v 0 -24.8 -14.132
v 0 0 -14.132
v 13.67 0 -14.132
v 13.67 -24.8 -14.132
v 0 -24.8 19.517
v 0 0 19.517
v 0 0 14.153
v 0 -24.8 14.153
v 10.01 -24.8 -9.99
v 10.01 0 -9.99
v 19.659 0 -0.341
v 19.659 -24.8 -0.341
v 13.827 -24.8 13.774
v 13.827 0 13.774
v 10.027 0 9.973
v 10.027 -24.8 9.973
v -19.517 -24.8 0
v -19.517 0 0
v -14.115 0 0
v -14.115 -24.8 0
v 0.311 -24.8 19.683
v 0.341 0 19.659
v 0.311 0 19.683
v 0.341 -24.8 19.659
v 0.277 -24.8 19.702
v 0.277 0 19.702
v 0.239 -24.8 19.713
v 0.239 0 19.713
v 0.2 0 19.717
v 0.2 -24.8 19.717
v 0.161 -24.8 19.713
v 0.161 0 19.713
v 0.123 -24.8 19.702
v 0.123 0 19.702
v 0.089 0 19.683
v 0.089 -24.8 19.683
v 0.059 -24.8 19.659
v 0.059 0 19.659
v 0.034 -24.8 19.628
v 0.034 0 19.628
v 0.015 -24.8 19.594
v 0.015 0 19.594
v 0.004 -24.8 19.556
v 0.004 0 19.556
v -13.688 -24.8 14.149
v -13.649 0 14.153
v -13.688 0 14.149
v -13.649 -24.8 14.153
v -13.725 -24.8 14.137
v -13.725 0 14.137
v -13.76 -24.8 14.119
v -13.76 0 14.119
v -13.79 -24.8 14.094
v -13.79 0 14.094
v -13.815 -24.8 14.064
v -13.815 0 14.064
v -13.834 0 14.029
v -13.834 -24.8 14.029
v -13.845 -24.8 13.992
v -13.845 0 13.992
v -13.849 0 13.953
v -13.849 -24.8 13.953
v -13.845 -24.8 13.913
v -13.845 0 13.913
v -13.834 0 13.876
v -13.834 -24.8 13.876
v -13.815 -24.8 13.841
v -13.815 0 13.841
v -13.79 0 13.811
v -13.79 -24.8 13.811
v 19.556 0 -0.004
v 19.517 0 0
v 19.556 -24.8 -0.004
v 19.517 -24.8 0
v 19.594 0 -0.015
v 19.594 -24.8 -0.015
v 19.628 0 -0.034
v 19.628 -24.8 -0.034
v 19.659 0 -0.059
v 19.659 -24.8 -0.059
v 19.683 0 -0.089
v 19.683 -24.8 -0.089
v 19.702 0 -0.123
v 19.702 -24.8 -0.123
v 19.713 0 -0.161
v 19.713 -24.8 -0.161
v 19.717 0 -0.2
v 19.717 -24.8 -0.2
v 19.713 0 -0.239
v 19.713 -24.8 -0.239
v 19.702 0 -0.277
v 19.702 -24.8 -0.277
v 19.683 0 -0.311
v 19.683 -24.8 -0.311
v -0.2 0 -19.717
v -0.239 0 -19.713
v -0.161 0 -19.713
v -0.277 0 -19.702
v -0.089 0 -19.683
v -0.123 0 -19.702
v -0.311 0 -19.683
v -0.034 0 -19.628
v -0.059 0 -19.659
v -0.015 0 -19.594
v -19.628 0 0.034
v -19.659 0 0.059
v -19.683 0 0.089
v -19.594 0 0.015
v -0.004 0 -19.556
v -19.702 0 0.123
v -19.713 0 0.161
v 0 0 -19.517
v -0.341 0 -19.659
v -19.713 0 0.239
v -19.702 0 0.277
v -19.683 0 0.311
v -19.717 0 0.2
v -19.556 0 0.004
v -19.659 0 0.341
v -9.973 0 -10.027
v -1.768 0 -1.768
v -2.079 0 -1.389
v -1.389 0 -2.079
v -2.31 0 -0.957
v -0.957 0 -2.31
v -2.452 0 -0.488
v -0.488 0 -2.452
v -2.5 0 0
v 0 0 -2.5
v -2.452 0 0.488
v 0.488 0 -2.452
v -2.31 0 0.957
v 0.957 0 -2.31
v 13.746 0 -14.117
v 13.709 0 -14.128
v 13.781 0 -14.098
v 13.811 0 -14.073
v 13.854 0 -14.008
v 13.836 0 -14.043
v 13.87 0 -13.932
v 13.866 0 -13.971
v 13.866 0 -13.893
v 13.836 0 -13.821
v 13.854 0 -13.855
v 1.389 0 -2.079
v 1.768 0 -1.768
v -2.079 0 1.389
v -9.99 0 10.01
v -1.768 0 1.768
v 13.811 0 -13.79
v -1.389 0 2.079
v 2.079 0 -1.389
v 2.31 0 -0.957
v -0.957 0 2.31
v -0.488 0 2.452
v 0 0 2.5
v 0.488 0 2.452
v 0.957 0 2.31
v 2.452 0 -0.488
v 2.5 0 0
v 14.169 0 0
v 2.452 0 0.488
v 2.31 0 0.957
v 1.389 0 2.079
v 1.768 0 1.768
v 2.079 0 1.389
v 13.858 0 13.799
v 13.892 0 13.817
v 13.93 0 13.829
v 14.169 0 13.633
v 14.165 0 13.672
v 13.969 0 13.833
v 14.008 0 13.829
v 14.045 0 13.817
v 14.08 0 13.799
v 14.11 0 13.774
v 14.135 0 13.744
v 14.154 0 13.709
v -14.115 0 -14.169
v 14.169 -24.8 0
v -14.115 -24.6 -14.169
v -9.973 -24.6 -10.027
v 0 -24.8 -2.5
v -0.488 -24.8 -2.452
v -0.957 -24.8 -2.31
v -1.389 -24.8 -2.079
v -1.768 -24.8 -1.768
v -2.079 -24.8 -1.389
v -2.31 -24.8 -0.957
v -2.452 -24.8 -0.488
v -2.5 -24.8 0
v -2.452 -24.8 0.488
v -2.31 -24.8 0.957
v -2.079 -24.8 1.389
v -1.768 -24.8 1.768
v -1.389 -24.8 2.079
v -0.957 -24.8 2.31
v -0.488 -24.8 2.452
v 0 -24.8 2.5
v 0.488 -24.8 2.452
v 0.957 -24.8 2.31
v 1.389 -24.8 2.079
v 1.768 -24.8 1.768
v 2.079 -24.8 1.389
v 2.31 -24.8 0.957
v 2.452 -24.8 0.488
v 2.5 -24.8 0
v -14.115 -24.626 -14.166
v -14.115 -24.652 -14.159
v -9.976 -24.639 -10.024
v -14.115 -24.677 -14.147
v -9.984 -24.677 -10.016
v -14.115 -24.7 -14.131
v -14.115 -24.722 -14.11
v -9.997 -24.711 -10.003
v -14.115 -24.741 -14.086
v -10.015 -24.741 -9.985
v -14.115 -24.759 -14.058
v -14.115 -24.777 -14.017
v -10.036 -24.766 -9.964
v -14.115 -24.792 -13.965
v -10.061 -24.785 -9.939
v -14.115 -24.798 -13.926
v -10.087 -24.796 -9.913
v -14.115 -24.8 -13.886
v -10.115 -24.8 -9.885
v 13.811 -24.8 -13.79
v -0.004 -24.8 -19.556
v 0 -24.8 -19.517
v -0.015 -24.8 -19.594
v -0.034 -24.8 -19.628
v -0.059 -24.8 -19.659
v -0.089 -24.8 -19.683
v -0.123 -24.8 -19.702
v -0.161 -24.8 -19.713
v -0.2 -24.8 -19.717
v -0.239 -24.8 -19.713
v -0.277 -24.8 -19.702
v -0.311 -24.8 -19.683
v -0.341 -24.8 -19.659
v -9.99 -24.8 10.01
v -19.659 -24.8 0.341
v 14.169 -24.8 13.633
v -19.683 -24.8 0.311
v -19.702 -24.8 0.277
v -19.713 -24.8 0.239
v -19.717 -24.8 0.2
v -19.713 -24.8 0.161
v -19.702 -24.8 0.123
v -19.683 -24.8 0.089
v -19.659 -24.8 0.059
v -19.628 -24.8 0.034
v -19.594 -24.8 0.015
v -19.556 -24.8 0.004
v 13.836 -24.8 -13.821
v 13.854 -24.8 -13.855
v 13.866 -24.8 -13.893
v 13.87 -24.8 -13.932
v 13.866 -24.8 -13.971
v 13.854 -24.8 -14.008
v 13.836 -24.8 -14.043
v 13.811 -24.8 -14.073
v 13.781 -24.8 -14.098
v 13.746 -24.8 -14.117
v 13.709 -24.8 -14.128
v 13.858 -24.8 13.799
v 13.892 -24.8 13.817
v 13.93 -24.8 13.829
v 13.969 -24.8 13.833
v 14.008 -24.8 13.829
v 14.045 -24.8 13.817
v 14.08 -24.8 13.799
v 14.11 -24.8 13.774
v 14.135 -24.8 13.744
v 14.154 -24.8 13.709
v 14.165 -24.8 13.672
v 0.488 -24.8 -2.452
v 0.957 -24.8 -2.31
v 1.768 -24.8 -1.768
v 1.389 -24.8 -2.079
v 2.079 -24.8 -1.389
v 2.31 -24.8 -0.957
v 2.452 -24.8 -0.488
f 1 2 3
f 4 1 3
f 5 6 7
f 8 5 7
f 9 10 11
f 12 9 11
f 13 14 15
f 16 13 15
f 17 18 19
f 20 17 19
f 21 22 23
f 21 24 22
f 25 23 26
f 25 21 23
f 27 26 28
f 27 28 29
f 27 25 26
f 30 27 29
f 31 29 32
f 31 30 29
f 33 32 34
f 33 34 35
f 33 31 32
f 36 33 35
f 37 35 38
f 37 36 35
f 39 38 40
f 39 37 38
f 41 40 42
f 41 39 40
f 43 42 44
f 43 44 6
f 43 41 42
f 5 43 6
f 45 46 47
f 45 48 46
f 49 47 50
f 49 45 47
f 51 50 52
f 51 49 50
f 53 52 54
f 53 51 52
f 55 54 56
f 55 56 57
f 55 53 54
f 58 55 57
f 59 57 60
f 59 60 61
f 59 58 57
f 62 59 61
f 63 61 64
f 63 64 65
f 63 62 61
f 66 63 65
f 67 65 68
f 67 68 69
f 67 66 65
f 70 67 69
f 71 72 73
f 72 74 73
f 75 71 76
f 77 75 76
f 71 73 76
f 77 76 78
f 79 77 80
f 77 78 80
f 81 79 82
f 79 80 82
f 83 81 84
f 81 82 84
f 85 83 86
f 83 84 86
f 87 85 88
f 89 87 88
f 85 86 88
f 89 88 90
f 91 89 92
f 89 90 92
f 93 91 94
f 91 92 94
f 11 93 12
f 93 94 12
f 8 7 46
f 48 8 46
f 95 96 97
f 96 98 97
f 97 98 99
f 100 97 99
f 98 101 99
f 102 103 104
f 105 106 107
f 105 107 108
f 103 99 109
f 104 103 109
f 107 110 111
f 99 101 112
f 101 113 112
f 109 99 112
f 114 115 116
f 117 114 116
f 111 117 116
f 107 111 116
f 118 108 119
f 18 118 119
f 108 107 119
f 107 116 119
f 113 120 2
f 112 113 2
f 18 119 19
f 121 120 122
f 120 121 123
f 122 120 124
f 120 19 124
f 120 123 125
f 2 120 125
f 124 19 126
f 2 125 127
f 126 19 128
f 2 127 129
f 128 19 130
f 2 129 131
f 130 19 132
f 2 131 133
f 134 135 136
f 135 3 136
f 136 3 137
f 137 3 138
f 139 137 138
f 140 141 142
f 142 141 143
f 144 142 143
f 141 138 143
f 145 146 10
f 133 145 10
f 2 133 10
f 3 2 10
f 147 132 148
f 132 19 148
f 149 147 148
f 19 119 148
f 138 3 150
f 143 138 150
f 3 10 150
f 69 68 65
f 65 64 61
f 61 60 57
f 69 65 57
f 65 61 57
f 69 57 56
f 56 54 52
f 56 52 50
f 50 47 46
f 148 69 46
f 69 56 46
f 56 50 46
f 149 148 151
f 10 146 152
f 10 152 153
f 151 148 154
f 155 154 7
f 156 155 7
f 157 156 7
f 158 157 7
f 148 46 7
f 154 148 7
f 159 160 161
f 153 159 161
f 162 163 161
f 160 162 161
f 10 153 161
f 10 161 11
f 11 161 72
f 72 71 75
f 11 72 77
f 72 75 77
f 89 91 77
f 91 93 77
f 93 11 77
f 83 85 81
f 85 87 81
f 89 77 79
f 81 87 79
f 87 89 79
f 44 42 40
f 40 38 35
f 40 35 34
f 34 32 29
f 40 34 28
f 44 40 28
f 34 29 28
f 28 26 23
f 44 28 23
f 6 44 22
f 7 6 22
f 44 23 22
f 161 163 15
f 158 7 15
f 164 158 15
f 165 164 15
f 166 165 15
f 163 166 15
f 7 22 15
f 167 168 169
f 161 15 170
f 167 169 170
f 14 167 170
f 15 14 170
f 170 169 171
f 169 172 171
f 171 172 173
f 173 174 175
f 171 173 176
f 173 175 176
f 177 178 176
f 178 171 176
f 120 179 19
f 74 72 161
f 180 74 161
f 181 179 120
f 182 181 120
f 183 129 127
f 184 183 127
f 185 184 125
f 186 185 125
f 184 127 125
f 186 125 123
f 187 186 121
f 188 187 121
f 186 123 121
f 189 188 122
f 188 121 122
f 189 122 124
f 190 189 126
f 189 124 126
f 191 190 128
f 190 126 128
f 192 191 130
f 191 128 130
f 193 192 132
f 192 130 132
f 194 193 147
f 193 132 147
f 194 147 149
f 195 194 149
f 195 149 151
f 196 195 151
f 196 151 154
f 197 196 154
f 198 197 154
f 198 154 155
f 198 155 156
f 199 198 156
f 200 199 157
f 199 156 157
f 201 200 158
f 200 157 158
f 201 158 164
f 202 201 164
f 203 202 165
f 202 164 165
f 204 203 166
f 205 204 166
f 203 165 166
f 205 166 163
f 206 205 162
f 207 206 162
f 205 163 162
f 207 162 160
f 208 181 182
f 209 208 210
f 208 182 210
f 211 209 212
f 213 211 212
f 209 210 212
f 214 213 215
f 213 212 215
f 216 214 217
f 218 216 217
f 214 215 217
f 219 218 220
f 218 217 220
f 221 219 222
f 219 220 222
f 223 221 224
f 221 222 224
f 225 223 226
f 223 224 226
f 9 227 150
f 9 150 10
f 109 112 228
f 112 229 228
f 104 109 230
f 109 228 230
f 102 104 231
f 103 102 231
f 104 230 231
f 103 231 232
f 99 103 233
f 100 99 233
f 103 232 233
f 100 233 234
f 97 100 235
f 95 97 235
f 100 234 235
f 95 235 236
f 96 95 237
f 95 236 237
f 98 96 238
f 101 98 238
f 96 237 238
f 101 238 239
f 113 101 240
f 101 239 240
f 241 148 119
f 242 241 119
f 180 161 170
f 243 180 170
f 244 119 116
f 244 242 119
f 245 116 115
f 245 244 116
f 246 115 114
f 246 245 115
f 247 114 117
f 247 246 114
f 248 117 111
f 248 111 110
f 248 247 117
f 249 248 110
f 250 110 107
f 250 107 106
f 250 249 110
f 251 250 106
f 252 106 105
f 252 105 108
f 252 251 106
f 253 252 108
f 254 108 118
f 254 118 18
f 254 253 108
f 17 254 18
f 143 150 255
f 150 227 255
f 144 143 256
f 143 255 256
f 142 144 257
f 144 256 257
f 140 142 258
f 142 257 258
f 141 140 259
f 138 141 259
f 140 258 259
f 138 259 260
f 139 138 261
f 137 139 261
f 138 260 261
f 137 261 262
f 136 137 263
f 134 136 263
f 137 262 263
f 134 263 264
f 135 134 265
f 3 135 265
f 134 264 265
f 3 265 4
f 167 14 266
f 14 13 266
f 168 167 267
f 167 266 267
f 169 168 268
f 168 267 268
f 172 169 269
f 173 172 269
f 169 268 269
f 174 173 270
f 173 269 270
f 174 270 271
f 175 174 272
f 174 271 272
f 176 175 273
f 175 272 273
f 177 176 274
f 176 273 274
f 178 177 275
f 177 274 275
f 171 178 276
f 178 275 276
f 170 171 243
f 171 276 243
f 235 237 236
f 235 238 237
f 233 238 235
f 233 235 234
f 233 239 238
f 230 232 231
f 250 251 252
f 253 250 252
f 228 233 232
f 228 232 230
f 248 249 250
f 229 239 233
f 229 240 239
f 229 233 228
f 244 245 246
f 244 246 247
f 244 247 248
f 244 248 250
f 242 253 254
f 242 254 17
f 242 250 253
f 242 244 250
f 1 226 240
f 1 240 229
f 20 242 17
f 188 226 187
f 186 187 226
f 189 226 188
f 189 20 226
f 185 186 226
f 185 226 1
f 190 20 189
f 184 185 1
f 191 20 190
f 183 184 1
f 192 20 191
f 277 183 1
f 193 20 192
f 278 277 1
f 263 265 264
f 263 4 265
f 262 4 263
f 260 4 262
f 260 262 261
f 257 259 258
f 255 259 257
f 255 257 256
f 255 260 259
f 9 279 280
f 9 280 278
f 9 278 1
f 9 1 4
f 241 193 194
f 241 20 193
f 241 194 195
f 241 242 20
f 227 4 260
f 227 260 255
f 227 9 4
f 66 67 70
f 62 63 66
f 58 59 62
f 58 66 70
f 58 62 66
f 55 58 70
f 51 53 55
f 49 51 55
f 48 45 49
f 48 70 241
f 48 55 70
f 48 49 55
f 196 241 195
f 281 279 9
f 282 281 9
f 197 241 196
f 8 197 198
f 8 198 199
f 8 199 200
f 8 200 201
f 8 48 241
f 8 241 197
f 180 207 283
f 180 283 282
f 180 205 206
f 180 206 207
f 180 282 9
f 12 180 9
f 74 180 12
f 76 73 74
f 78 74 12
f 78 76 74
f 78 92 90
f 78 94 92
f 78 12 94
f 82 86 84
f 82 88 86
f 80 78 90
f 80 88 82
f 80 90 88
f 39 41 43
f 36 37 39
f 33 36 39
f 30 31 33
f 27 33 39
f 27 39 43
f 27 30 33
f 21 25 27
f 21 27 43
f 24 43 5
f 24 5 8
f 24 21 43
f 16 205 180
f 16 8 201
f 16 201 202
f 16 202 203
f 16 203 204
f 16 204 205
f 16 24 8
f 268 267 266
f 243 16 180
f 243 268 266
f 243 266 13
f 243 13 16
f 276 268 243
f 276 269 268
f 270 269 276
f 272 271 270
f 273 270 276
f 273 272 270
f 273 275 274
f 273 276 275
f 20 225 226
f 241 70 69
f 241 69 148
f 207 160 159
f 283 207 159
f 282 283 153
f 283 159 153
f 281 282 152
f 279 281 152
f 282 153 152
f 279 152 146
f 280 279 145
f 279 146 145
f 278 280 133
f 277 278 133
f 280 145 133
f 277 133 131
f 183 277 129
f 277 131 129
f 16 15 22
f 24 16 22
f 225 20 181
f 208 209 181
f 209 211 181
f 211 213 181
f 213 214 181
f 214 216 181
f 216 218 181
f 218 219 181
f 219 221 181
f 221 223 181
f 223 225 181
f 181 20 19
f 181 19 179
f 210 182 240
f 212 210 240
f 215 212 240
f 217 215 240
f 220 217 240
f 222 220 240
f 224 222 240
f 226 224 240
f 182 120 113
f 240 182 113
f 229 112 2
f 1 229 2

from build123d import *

# Parameters (mm, degrees)
F1_DEPTH = 24.8
F2_R     = 0.2


with BuildPart() as f1:
    # F0 (on Front) → F1 (new body)
    with BuildSketch(Plane.XZ):
        Polygon((10.026696, 9.973304), (0, 20), (0, 14.152517), (-14.131747, 14.152517), (-9.989615, 10.010385), (-20, 0), (-14.115414, 0), (-14.115414, -14.168807), (-9.973304, -10.026696), (0, -20), (0, -14.131747), (14.152517, -14.131747), (10.010385, -9.989615), (20, 0), (14.168807, 0), (14.168807, 14.115414), align=None)
        with BuildLine():
            ThreePointArc((0, -2.5), (-1.767767, 1.767767), (2.5, 0))
            ThreePointArc((2.5, 0), (1.767767, -1.767767), (0, -2.5))
        make_face(mode=Mode.SUBTRACT)
    extrude(amount=F1_DEPTH)

    # F2
    f2_edges = [f1.edges().sort_by_distance(p)[0] for p in [
        (0, -12.4, 20),
        (14.168807, -12.4, 14.115414),
        (20, -12.4, 0),
        (14.152517, -12.4, -14.131747),
        (0, -12.4, -20),
        (-12.044359, -24.8, -12.097752),
        (-20, -12.4, 0),
        (-14.131747, -12.4, 14.152517),
    ]]
    fillet(f2_edges, radius=F2_R)


solid = f1.part
